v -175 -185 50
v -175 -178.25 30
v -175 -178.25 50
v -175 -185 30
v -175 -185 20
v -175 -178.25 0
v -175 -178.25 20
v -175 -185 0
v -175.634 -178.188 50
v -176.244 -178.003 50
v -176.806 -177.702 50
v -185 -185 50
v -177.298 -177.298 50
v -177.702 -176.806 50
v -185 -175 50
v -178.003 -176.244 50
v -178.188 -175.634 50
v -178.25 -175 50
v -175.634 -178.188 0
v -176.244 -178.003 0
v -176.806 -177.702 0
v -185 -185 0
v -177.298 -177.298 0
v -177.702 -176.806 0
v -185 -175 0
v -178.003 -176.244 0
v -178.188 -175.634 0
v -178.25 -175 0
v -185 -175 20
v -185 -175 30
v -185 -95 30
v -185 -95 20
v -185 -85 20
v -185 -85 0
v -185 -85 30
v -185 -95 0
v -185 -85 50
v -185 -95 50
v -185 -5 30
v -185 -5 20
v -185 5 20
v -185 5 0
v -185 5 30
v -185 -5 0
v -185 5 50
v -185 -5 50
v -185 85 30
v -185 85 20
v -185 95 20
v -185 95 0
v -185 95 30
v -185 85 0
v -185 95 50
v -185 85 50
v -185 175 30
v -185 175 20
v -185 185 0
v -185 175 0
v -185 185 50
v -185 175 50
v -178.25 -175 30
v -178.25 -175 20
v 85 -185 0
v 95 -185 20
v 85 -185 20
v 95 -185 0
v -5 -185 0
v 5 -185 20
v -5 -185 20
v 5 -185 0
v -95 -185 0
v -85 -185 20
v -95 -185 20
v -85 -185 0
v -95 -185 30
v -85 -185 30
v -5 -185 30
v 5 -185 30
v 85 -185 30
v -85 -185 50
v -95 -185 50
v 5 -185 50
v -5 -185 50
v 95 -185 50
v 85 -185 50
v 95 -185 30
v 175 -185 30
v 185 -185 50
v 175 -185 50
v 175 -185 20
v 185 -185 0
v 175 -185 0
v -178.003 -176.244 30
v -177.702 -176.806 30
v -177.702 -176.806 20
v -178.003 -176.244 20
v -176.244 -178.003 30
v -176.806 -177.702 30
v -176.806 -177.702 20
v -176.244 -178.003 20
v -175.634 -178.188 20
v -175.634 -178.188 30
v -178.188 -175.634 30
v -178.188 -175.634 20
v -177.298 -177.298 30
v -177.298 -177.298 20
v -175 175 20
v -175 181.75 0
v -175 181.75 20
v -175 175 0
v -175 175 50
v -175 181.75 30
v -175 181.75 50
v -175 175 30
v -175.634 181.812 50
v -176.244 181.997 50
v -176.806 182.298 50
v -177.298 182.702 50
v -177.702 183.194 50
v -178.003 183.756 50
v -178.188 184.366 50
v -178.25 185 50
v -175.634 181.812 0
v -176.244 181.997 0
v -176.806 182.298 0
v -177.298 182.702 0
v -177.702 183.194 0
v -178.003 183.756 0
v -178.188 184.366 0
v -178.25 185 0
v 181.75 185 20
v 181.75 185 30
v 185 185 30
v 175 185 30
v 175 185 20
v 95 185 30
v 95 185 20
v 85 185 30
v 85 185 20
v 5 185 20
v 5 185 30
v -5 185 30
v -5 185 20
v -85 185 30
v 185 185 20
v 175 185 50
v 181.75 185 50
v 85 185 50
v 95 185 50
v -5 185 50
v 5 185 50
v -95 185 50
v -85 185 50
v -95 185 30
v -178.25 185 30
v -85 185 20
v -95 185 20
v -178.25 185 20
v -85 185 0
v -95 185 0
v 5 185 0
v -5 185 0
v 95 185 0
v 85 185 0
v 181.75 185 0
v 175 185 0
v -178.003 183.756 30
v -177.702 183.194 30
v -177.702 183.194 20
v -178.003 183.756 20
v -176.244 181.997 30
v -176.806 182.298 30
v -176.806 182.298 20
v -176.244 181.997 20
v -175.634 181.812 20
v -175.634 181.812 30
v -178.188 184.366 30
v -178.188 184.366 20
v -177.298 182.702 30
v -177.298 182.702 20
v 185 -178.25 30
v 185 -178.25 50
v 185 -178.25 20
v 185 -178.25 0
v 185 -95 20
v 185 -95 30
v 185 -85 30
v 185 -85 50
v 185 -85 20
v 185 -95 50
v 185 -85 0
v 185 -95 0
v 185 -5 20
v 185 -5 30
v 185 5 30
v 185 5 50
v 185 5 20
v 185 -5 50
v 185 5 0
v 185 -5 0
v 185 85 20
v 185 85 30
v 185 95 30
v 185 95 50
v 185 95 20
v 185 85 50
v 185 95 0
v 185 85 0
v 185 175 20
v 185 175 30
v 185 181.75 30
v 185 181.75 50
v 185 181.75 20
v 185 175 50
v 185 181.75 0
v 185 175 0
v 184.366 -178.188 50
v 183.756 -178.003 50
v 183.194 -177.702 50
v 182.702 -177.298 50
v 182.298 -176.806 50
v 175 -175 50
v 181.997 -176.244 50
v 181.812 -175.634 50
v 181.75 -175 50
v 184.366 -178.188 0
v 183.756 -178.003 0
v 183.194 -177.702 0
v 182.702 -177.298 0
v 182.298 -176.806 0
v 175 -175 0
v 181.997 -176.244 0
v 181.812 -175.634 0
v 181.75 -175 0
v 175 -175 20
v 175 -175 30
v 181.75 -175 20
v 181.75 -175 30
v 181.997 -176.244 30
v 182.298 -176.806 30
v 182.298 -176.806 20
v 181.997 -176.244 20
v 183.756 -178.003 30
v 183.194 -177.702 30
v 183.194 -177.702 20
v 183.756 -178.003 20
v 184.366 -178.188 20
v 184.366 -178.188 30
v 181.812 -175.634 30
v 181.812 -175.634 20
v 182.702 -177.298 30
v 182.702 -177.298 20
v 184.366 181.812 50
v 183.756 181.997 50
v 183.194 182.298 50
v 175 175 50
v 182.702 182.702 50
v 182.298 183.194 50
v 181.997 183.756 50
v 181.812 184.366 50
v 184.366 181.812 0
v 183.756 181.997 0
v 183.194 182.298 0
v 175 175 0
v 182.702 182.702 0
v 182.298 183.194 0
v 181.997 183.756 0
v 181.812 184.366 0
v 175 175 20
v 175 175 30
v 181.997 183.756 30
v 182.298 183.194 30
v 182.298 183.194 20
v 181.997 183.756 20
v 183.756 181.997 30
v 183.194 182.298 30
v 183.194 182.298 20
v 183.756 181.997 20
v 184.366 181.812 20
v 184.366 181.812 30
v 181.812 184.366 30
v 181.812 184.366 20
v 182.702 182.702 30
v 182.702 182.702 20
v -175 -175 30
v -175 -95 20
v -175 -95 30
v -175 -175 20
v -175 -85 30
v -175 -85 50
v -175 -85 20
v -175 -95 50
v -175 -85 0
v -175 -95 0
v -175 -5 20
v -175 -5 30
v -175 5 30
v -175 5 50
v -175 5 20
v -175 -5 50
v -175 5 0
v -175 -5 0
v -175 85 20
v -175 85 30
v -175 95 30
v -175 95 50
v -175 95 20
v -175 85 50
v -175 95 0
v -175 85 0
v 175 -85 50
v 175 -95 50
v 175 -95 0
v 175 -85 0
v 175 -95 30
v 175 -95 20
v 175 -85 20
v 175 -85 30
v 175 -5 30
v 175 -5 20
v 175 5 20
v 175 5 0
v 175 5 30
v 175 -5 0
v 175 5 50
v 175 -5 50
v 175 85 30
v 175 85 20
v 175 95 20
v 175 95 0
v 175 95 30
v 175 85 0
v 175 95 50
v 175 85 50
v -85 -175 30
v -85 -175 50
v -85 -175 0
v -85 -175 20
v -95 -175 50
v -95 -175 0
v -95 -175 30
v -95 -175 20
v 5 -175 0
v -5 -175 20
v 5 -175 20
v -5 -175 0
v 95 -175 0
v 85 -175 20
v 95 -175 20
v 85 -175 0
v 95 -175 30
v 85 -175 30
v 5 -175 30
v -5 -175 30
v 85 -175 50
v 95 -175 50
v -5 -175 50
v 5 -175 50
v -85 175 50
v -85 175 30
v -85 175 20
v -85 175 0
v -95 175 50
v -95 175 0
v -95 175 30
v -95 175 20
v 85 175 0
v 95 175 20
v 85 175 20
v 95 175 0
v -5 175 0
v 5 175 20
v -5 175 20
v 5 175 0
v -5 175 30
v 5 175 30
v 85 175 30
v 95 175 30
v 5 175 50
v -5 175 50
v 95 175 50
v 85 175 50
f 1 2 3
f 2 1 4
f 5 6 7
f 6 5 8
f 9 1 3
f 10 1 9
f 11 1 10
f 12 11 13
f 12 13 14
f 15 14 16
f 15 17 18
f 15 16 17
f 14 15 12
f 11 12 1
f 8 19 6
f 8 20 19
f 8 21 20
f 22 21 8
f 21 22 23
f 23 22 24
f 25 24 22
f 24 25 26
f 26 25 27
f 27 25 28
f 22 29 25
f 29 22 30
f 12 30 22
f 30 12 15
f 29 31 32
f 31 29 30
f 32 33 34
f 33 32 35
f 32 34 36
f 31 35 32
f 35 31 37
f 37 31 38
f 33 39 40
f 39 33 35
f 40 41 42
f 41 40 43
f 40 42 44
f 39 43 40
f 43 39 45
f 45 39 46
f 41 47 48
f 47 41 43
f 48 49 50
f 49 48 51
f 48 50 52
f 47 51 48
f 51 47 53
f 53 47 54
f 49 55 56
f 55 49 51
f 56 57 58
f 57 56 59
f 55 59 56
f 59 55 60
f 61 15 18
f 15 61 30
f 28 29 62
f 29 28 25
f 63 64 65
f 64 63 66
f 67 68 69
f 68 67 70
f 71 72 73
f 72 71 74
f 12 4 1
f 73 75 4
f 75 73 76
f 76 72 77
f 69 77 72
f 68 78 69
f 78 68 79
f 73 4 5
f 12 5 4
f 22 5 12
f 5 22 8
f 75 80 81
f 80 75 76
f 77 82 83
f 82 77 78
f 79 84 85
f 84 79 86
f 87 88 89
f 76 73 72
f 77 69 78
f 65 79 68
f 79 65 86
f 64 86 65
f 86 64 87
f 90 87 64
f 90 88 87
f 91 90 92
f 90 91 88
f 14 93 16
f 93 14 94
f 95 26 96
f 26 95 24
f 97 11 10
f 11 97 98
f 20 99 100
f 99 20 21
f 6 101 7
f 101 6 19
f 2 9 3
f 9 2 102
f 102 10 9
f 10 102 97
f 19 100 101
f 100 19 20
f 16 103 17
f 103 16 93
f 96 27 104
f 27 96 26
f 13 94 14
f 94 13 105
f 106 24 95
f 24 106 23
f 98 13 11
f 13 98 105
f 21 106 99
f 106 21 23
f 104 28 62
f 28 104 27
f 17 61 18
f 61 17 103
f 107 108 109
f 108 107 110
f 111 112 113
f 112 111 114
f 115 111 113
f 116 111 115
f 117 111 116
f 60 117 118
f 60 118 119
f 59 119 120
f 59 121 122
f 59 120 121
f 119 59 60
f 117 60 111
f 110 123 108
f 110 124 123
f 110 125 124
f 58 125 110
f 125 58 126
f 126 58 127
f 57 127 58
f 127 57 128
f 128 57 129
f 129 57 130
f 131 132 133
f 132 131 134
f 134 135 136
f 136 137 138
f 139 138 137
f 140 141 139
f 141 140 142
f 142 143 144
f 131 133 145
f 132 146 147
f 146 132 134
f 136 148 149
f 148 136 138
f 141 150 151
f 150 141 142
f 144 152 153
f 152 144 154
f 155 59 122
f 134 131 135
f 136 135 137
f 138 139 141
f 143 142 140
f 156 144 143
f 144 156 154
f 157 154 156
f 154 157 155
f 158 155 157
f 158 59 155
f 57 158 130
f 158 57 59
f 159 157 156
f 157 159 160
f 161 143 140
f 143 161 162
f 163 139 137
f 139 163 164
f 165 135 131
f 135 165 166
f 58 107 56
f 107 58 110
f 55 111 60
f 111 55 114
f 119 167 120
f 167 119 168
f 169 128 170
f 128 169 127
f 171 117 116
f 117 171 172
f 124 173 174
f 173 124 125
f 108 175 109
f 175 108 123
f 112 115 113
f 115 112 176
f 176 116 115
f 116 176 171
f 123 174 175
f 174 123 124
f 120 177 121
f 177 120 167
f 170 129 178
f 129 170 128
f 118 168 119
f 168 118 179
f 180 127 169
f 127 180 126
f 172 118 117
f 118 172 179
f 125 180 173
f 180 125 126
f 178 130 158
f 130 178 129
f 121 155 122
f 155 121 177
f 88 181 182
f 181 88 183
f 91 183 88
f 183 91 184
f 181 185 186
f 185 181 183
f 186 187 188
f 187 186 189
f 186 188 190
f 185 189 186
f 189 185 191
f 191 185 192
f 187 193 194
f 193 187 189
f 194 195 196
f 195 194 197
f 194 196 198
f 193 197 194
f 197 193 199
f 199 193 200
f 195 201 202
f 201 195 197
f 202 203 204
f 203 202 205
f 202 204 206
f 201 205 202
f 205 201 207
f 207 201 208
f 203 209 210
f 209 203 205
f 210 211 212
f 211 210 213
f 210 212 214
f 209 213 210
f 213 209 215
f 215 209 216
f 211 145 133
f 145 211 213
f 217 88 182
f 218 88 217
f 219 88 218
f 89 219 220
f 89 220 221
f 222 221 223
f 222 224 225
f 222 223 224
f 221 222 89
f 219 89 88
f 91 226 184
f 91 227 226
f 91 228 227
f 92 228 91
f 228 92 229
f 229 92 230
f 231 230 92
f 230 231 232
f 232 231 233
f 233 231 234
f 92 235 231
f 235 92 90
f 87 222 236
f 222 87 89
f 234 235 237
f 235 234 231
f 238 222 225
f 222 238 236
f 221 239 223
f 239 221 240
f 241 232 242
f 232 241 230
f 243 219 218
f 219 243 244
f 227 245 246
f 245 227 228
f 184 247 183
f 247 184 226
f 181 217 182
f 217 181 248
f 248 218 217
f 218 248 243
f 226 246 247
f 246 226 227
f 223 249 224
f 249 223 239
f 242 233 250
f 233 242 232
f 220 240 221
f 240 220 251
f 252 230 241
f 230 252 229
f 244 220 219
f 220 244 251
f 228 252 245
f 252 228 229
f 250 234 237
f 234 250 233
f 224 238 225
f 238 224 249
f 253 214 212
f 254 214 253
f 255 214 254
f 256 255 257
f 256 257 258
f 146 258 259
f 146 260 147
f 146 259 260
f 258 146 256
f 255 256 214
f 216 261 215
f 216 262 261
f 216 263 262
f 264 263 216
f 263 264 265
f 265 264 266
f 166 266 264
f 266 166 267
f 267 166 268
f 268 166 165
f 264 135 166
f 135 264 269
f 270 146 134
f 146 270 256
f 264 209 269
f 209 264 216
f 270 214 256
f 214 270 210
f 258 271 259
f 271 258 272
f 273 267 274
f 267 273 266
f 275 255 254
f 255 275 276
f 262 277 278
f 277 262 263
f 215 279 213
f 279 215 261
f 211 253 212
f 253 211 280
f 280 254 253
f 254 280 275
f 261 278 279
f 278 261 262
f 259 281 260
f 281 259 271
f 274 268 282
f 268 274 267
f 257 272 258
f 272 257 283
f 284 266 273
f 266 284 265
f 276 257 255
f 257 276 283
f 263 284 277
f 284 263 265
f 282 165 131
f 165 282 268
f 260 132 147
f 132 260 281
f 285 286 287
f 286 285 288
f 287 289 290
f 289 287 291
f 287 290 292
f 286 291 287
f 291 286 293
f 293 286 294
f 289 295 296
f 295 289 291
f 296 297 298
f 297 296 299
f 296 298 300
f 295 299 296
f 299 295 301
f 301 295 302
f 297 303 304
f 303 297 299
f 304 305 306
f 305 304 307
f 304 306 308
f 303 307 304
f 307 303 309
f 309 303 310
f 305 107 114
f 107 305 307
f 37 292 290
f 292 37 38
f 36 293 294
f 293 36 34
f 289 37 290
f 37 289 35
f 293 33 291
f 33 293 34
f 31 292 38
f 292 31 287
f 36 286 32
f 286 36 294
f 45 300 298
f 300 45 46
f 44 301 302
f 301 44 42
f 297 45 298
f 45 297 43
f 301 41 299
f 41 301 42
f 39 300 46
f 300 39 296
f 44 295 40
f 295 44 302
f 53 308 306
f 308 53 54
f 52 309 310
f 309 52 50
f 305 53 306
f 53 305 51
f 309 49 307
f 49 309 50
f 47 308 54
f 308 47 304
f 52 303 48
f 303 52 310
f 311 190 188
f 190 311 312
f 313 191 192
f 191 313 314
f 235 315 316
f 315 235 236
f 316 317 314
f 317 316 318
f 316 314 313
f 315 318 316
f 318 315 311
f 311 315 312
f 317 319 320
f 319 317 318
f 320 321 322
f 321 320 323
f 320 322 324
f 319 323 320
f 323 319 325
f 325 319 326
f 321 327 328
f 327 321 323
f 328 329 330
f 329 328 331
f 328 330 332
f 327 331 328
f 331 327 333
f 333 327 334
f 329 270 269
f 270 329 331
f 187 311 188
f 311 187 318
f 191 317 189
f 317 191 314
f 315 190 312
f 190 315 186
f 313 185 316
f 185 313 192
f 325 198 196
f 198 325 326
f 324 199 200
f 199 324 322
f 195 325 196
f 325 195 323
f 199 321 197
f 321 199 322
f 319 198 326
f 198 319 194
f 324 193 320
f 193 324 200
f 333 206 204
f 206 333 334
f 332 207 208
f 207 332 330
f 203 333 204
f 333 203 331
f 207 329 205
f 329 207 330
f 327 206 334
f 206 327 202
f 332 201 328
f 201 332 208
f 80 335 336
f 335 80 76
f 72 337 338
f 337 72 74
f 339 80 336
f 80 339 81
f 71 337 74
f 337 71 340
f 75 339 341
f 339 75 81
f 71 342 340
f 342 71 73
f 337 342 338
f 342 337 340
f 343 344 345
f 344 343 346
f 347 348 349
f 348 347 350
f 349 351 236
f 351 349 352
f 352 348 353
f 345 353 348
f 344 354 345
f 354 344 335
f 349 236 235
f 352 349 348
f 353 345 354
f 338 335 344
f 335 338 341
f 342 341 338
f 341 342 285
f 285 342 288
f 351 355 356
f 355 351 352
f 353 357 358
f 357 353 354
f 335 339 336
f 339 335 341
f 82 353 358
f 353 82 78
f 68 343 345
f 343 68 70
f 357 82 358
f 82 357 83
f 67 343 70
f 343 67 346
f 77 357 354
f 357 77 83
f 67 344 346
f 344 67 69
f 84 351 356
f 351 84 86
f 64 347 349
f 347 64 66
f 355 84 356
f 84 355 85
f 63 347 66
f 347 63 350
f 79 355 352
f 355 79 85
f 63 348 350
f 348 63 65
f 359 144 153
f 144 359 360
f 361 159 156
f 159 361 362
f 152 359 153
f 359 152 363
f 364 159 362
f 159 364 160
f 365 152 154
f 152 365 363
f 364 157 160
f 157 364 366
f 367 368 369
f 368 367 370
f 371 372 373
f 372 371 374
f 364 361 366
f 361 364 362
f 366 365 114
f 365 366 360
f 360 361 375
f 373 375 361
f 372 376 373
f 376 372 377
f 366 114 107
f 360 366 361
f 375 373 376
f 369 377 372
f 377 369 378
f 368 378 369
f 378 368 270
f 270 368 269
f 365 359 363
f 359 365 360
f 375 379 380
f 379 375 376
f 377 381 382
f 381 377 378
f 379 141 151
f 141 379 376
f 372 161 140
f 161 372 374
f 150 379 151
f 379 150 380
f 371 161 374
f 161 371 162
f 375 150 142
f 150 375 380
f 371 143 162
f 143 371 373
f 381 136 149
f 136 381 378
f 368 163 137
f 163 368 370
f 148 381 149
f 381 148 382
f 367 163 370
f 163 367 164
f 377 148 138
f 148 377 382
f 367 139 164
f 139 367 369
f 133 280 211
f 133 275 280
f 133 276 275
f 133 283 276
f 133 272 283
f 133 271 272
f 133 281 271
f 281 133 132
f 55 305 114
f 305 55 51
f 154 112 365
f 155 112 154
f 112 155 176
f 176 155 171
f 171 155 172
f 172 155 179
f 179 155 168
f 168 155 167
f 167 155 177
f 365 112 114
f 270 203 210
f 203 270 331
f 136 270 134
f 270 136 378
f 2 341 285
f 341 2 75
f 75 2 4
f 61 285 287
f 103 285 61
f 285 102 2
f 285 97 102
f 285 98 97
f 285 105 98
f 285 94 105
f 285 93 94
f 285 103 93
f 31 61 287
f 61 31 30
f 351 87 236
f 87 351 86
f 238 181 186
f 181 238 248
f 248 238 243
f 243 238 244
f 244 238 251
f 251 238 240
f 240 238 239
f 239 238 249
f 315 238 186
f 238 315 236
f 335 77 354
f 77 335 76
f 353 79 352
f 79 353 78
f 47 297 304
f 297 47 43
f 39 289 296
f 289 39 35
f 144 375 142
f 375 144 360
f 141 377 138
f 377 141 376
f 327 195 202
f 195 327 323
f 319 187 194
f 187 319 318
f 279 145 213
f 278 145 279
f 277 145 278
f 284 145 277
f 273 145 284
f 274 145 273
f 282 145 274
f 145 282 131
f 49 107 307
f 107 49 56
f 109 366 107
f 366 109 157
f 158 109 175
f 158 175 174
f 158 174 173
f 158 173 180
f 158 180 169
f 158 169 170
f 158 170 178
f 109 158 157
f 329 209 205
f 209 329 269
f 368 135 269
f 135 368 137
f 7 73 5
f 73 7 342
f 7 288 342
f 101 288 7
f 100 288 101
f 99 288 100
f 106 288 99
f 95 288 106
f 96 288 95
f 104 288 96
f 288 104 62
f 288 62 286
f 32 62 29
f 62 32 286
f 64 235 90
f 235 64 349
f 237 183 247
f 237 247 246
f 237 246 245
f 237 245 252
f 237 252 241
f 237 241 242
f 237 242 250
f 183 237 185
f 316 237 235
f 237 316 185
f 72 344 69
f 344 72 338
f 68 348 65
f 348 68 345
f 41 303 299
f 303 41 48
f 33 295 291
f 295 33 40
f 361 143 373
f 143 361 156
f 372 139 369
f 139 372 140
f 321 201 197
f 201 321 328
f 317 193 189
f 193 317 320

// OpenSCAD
positions = [[-180,-180],[-180,-90],[-180,0],[-180,90],[-180,180],[180,-180],[180,-90],[180,0],[180,90],[180,180],[-90,-180],[0,-180],[90,-180],[-90,180],[0,180],[90,180]];
module vert(px,py){
translate([px,py,25])
difference(){
cube([10,10,50],center=true);
if (abs(px)==180 && abs(py)==180){
translate([5,5,0]) cylinder(r=3.25,h=55,$fn=32,center=true);
}
}
}
module hleft(zh){translate([-180,0,zh]) cube([10,370,10],center=true);}
module hright(zh){translate([180,0,zh]) cube([10,370,10],center=true);}
module hfront(zh){translate([0,-180,zh]) cube([370,10,10],center=true);}
module hback(zh){translate([0,180,zh]) cube([370,10,10],center=true);}
for(p=positions){
vert(p[0],p[1]);
}
hleft(25);
hright(25);
hfront(25);
hback(25);
